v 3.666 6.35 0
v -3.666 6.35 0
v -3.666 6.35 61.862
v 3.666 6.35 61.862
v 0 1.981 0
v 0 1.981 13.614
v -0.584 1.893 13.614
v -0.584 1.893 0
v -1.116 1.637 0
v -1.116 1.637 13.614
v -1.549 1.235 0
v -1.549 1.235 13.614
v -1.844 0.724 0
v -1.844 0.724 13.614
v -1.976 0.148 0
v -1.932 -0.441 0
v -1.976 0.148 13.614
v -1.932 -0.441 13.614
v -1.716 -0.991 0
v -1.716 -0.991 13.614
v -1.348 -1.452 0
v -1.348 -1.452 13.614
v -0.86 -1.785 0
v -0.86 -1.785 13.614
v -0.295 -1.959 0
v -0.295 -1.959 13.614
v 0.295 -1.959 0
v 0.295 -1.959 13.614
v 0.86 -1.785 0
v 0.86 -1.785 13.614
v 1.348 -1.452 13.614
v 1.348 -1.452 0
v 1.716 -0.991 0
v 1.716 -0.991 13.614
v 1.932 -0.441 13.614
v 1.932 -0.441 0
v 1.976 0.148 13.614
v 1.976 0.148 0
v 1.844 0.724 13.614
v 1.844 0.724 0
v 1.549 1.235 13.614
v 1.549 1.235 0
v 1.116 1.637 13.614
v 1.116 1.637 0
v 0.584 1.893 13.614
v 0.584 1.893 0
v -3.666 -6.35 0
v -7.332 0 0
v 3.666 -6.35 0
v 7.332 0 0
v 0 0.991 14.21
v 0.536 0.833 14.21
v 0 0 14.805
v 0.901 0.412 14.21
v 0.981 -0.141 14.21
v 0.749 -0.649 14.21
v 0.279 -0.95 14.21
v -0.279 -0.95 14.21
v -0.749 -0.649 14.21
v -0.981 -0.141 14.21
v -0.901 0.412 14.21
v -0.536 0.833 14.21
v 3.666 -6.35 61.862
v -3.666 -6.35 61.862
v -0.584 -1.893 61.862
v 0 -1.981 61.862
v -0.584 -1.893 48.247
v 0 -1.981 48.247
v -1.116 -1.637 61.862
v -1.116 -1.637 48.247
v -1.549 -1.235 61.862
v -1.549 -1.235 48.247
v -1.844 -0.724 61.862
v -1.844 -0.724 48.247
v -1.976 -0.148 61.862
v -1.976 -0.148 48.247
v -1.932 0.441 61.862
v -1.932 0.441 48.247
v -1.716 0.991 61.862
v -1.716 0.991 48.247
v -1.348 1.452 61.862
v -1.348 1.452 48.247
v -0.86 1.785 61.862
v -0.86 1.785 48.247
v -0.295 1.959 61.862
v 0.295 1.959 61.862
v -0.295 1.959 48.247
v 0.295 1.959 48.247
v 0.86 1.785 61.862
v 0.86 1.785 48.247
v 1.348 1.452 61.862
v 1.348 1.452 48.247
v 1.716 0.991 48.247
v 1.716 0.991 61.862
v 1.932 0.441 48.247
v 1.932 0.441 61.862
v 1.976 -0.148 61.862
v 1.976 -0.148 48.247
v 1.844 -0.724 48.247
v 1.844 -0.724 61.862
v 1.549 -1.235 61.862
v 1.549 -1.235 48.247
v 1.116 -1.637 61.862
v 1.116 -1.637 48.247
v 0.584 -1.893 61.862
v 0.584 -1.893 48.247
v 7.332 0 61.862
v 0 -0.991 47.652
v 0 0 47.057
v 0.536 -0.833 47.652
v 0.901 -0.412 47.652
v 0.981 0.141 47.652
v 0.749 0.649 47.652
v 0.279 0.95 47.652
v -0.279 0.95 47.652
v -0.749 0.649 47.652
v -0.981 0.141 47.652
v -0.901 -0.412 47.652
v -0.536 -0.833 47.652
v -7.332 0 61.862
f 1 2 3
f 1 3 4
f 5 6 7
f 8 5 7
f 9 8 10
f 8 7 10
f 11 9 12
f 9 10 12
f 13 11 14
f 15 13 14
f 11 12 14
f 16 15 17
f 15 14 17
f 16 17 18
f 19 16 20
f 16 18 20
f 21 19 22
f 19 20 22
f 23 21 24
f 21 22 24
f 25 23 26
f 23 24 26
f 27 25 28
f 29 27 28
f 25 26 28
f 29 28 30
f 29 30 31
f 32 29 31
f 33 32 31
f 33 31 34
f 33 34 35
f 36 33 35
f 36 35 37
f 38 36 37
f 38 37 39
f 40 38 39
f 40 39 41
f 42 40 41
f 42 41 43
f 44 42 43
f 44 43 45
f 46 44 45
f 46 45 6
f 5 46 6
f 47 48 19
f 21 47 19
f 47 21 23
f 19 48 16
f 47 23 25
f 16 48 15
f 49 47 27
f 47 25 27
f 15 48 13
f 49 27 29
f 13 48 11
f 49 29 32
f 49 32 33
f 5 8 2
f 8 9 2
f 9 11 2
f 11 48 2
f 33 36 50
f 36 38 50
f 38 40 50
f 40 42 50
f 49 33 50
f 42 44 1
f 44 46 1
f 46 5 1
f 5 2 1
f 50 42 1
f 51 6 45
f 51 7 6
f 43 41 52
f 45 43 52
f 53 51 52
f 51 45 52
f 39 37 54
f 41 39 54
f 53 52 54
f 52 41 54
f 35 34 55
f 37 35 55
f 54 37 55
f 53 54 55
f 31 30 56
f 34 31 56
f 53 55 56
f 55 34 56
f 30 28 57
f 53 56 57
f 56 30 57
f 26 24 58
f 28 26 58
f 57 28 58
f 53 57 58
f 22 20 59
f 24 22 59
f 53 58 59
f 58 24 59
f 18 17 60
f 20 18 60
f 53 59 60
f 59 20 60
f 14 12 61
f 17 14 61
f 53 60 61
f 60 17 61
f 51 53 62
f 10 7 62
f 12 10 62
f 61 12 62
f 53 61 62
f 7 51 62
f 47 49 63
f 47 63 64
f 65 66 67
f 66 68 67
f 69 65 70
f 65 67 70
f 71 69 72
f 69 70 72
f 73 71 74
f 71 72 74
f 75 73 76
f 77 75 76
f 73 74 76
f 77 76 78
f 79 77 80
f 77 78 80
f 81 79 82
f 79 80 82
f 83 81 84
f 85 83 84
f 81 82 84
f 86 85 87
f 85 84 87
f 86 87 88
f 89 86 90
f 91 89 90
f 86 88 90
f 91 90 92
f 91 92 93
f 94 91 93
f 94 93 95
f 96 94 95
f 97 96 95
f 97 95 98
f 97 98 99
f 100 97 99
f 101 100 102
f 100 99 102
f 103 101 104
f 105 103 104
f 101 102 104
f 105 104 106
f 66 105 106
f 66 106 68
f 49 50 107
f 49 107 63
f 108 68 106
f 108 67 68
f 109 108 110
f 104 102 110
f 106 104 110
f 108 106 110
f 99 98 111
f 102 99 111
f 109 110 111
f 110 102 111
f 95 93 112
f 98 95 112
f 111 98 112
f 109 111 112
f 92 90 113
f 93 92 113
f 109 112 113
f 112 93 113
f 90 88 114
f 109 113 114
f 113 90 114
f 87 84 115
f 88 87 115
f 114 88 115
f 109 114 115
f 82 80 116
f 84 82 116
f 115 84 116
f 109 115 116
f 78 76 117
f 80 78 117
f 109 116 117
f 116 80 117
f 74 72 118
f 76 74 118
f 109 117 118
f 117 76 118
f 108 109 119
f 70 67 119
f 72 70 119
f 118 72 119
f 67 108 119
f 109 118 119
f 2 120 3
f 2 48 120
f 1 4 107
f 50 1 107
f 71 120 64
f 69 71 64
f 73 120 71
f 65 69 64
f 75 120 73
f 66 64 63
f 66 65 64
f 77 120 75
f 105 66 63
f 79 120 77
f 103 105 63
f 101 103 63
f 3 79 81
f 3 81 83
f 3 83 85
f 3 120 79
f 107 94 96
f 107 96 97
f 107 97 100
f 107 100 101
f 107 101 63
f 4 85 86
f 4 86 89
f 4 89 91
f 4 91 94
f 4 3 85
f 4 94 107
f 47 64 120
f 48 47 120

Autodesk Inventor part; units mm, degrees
ref_plane "YZ Plane" through (0, 0, 0) normal (1, 0, 0) x (0, 1, 0)
ref_plane "XZ Plane" through (0, 0, 0) normal (0, 1, 0) x (-1, 0, 0)
ref_plane "XY Plane" through (0, 0, 0) normal (0, 0, 1) x (1, 0, 0)
sketch "Sketch1" plane through (0, 0, 0) normal (0, 0, 1) x (1, 0, 0)
  line L0 (3.6662, -6.35) -> (-3.6662, -6.35)
  line L1 (-3.6662, -6.35) -> (-7.3323, 0)
  line L2 (-7.3323, 0) -> (-3.6662, 6.35)
  line L3 (-3.6662, 6.35) -> (3.6662, 6.35)
  line L4 (3.6662, 6.35) -> (7.3323, 0)
  line L5 (7.3323, 0) -> (3.6662, -6.35)
  point P0 (0, 0)
  point P1 (0, 0)
  dimension "d0" = 12.7
extrude "Extrusion1" add sketch "Sketch1" along normal blind 61.8617
sketch "Sketch2" plane through (0, 0, 61.8617) normal (0, 0, 1) x (1, 0, 0)
  point P0 (0, 0)
  point P1 (0, 0)
hole "Hole1" at (0, 0, 61.8617) direction (0, 0, -1) diameter 3.9624 depth 13.6144 tip angle 118 thread size "10-32 UNF" class "2B" standard "ANSI Unified Screw Threads"
sketch "Sketch3" plane through (0, 0, 0) normal (0, 0, -1) x (-1, 0, 0)
  circle A0 centre (0, 0) radius 1.9812 projected
hole "Hole2" at (0, 0, 0) direction (0, 0, 1) diameter 3.9624 depth 13.6144 tip angle 118 thread size "10-32 UNF" class "2B" standard "ANSI Unified Screw Threads"
properties part number "STOCK,HEX,SHAFT,TURRET,ENCODER" material "Aluminum 6061"
